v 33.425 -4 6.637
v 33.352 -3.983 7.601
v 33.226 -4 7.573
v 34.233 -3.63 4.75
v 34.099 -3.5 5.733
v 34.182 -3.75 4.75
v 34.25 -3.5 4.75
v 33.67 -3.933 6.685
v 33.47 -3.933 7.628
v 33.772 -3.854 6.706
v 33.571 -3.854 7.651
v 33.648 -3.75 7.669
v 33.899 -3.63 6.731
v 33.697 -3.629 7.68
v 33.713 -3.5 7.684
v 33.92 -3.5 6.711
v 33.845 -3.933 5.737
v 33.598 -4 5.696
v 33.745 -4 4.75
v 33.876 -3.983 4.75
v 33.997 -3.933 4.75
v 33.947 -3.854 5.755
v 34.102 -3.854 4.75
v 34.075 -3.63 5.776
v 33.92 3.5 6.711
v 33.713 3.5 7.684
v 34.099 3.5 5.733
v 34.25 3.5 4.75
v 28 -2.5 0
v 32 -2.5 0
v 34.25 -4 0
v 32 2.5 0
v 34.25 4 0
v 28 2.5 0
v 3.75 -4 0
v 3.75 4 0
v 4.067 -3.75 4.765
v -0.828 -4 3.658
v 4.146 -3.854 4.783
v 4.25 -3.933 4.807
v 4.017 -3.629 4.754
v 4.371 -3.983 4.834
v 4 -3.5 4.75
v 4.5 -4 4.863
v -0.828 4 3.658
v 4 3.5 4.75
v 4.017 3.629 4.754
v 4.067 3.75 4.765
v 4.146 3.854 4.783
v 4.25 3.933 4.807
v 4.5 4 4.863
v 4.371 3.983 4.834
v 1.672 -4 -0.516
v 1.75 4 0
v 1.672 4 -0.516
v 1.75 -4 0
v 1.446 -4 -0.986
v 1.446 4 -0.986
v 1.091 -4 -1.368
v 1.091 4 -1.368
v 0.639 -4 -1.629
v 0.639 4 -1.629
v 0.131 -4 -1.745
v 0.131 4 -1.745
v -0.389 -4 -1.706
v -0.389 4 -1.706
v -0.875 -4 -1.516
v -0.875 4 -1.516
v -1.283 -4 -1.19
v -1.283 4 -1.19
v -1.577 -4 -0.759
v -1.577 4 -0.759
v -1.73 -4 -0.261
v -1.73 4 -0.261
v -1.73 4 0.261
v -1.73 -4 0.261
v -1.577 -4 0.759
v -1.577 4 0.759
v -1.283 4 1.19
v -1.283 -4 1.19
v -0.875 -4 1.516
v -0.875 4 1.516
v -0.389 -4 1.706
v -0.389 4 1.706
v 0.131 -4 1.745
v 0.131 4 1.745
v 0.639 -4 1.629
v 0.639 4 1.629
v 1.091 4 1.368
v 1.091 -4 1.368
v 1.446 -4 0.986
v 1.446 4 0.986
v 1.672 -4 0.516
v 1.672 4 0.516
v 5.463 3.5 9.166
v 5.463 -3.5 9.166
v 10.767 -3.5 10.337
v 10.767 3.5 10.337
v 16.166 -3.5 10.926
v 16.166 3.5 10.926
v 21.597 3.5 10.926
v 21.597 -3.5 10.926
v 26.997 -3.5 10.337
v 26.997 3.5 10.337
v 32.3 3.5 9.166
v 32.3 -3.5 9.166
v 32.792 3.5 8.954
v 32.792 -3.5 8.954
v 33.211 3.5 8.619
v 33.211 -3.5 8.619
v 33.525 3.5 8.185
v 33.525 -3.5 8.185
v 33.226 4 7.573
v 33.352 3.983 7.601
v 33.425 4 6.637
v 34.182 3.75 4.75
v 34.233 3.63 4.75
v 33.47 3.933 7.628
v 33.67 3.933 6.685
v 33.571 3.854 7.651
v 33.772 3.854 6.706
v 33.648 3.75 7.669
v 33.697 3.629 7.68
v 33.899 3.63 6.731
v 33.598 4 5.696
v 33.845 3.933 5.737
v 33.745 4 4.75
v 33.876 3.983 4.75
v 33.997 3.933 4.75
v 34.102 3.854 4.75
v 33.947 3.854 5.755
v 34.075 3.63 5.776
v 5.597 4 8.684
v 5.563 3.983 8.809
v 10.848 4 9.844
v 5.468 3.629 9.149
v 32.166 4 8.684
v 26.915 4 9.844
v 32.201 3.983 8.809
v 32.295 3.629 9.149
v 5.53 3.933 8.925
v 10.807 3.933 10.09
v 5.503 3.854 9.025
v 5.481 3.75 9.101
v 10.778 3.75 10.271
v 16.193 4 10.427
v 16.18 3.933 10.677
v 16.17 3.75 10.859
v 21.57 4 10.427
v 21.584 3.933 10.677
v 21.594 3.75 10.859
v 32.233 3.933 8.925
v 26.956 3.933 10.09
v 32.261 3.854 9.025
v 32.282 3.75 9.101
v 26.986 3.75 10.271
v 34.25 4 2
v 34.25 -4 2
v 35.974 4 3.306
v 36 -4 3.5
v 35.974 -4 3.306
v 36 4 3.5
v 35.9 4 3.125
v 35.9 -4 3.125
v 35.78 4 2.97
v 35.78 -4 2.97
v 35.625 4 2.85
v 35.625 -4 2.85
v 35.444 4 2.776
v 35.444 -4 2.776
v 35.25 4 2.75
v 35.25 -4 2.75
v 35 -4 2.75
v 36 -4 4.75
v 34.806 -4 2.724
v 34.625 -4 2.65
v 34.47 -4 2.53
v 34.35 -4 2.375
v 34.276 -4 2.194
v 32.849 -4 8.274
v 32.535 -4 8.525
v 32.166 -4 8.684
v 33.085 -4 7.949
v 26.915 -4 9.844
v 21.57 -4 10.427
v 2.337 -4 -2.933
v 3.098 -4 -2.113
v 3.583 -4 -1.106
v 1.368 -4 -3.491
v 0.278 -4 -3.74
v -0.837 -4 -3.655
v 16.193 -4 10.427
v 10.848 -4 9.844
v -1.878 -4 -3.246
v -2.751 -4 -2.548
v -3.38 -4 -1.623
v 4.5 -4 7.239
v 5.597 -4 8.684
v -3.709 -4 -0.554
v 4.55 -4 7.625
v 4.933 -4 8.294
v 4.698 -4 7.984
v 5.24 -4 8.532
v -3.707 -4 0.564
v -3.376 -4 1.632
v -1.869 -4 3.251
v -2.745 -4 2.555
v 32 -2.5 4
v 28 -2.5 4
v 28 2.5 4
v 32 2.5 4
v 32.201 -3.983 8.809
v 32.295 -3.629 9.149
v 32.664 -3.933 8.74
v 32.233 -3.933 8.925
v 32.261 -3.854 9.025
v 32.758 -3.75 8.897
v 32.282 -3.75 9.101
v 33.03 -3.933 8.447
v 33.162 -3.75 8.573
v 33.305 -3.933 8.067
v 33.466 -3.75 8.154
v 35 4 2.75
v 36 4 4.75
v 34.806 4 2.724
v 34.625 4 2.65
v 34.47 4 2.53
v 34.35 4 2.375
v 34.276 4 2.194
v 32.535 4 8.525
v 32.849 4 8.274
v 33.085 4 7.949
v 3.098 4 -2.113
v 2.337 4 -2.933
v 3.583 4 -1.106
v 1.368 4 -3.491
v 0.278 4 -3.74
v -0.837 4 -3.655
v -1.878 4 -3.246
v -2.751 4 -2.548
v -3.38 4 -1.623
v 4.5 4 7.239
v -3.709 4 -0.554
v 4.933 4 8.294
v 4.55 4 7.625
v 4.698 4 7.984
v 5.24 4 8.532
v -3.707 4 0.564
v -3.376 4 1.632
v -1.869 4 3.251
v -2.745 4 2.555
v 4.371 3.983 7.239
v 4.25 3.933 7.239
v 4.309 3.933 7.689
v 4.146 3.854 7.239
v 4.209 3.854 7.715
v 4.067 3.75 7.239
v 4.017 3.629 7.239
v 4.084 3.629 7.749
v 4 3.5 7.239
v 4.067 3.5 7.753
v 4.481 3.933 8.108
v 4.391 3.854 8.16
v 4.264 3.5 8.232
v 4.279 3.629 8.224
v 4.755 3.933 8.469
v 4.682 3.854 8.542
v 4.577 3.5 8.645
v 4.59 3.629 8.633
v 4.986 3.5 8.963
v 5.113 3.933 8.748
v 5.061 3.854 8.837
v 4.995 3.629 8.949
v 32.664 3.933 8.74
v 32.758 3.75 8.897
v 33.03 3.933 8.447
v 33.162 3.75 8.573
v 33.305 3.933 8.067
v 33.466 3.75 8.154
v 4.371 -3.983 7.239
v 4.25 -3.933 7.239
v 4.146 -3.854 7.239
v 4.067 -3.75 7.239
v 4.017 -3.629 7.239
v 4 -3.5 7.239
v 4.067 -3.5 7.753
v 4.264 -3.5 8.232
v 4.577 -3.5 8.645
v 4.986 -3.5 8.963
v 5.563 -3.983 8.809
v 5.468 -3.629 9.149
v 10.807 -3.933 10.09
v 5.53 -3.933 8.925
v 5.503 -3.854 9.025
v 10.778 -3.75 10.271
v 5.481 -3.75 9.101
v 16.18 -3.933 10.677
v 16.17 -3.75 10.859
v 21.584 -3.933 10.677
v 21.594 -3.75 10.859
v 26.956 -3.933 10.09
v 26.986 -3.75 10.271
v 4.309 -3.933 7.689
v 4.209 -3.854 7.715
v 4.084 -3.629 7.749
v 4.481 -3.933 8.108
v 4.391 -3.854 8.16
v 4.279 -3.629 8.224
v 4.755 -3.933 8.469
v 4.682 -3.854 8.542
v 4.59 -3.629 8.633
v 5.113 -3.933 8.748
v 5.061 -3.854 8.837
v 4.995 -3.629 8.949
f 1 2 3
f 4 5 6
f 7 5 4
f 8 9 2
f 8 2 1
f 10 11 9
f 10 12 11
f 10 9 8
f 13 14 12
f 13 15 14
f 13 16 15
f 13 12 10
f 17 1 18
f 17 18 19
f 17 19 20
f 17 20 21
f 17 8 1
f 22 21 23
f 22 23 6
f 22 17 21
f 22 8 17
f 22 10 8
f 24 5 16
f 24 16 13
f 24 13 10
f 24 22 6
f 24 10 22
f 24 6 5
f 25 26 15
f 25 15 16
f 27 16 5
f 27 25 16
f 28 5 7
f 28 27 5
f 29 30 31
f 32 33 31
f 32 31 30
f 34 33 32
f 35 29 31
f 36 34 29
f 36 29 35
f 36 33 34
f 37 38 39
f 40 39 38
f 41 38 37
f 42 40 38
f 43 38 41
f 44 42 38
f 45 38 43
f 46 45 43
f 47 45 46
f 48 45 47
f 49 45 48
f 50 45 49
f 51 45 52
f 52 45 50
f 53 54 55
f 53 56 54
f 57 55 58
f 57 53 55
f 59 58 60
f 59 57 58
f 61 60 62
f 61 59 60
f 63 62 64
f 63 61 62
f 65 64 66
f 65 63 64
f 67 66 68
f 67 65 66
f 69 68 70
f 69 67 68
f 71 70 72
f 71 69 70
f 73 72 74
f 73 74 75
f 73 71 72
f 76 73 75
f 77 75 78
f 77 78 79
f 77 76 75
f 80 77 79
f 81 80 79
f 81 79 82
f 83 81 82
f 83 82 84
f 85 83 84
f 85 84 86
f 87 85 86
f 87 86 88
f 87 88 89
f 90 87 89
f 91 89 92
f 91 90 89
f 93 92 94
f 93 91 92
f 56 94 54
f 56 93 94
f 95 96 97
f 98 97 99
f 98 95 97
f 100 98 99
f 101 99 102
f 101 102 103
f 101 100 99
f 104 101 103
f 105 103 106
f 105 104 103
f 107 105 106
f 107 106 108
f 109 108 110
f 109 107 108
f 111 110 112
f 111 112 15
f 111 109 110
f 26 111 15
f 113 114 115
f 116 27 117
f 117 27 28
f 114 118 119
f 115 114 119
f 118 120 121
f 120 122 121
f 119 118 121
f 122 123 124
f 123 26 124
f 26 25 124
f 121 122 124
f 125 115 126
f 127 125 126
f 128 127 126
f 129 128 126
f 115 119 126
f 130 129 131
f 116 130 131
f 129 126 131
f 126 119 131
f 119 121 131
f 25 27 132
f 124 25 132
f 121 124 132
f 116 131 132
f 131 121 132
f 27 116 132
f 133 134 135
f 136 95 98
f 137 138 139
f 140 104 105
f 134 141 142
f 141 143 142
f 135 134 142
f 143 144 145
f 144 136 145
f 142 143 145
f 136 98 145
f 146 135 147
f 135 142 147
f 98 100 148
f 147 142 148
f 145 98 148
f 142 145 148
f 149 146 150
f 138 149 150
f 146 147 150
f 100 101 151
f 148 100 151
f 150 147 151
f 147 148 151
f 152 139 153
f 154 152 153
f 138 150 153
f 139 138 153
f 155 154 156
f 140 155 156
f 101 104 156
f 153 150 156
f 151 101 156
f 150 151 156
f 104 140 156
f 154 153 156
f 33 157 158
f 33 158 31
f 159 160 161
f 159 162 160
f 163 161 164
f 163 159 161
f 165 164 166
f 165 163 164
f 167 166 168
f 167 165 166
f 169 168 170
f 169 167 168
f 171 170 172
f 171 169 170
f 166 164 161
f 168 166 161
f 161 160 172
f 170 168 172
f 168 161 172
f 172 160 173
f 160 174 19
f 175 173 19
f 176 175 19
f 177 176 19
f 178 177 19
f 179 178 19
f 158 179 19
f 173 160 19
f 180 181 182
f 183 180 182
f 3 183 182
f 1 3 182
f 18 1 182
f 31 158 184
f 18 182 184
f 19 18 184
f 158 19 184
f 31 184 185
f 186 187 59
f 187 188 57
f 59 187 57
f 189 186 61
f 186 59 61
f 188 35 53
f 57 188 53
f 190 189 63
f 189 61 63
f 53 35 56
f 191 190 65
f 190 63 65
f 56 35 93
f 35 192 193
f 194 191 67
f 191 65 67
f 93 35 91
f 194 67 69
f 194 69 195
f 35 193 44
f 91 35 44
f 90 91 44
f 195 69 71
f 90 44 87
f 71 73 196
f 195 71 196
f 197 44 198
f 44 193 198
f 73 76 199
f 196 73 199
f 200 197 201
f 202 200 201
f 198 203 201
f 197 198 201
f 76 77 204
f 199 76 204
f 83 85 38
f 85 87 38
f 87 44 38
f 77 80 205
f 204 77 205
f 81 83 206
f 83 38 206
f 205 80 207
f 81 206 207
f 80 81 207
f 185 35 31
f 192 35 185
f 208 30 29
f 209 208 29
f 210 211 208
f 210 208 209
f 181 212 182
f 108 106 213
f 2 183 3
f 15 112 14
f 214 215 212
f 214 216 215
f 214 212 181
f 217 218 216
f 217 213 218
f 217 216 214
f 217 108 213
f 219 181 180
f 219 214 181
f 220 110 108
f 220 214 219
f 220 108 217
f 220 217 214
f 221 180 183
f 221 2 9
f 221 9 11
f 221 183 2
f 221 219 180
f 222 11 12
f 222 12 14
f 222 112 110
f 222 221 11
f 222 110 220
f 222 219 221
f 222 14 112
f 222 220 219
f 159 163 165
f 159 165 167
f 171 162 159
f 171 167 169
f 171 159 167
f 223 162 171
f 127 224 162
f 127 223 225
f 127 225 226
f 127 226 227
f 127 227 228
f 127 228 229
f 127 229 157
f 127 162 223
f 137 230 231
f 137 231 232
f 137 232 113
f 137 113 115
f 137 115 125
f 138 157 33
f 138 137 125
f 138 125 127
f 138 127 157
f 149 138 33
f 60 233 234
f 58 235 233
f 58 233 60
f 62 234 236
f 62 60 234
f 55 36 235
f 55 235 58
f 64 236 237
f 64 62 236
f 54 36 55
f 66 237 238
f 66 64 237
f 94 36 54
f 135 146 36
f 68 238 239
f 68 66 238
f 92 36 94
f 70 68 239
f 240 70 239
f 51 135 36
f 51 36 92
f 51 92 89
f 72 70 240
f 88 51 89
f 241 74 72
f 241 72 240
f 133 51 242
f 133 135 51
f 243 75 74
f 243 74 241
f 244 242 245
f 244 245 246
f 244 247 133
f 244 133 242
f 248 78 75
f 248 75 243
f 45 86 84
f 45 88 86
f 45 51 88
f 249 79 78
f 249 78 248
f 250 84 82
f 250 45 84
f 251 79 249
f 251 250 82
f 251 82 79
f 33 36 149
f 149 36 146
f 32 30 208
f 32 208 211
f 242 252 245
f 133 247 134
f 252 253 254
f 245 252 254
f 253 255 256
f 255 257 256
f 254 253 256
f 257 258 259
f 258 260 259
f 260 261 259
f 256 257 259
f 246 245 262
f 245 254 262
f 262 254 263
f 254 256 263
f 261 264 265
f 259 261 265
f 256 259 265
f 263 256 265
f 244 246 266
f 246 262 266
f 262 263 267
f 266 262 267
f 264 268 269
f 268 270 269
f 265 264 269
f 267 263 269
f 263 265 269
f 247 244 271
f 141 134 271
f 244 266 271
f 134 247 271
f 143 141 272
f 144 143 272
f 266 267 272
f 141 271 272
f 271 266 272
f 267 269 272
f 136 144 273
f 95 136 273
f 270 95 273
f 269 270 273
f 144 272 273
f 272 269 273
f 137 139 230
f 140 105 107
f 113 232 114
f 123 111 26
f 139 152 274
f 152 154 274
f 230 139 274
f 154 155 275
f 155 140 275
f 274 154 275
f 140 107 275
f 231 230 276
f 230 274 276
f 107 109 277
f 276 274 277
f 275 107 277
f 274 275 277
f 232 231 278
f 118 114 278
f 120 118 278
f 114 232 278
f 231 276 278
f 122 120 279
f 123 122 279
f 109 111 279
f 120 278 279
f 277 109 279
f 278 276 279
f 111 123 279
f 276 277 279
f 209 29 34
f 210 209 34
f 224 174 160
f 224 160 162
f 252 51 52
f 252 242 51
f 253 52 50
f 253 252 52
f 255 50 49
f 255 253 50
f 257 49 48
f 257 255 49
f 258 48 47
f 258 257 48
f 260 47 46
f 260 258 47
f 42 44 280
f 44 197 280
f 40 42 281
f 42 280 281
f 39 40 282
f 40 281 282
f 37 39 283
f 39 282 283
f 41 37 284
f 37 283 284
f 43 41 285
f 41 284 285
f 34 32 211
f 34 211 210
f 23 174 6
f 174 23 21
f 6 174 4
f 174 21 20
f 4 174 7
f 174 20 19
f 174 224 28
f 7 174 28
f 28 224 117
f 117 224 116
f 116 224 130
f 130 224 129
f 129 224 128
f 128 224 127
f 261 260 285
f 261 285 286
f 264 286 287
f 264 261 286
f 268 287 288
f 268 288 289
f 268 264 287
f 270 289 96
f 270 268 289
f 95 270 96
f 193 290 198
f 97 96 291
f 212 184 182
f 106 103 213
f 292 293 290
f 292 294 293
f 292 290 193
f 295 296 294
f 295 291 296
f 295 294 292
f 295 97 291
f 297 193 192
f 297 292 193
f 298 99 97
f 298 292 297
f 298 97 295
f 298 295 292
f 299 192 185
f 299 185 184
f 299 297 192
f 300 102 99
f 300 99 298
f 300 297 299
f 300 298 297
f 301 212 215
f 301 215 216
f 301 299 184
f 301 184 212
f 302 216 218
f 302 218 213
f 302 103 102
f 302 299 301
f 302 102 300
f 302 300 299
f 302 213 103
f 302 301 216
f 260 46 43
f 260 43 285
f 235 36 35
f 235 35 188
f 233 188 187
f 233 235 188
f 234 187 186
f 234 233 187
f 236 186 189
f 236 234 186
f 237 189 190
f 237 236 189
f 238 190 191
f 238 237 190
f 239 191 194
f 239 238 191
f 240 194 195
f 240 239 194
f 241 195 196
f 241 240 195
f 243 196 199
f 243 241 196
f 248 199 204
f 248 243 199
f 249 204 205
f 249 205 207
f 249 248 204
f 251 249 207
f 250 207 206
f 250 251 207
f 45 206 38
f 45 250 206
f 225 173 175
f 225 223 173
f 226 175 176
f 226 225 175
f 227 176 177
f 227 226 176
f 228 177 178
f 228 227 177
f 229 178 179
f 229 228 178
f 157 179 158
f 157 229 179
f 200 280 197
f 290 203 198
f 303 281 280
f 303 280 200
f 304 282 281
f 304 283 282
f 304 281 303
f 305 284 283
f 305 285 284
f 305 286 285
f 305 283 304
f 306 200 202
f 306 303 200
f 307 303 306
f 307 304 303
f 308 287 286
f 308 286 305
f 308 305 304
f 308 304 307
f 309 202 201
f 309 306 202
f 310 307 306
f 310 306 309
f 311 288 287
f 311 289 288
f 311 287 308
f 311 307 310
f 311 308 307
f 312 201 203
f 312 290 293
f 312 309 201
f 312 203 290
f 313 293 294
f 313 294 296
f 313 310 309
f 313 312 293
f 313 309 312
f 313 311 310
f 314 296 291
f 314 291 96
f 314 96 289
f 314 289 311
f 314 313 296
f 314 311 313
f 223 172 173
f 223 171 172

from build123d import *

# Parameters (mm, degrees)
SKETCH1_R           = 1.75
BOSS_EXTRUDE1_DEPTH = 4
SKETCH3_W           = 1.75
SKETCH3_H           = 8
BOSS_EXTRUDE2_DEPTH = 2
FILLET1_R           = 0.5
SKETCH4_W           = 4
SKETCH4_H           = 5
CUT_EXTRUDE1_DEPTH  = 4
FILLET2_R           = 0.75


with BuildPart() as part:
    # Sketch1 → Boss-Extrude1 (new, symmetric)
    with BuildSketch(Plane(origin=(0, 0, 0), x_dir=(1, 0, 0), z_dir=(0, 1, 0))):
        with BuildLine():
            Line((34.25, 0), (3.75, 0))
            ThreePointArc((3.75, 0), (-2.34080149, 2.929701074), (-0.827679139, -3.657519275))
            Line((-0.827679139, -3.657519275), (4, -4.75))
            Line((4, -4.75), (4, -7.239192993))
            ThreePointArc((4, -7.239192993), (4.407286712, -8.448847647), (5.463264382, -9.165826034))
            ThreePointArc((5.463264382, -9.165826034), (18.881654838, -11), (32.300045295, -9.165826034))
            ThreePointArc((32.300045295, -9.165826034), (33.210788376, -8.619339874), (33.713306247, -7.68361776))
            ThreePointArc((33.713306247, -7.68361776), (34.013295596, -6.222597745), (34.25, -4.75))
            Line((34.25, -4.75), (34.25, 0))
        make_face()
        Circle(SKETCH1_R, mode=Mode.SUBTRACT)
    extrude(amount=BOSS_EXTRUDE1_DEPTH, both=True)

    # Sketch3 → Boss-Extrude2 (add)
    with BuildSketch(Plane(origin=(0, 0, 4.75), x_dir=(-1, 0, 0), z_dir=(0, 0, -1))):
        with Locations((-35.125, 0)):
            Rectangle(SKETCH3_W, SKETCH3_H)
    extrude(amount=BOSS_EXTRUDE2_DEPTH)

    # Fillet1
    fillet1_edges = [part.edges().sort_by_distance(p)[0] for p in [
        (4, 4, 5.994596496),
        (4, -4, 5.994596496),
        (4.407286712, -4, 8.448847647),
        (18.881654838, -4, 11),
        (33.210788376, -4, 8.619339874),
        (34.013295596, -4, 6.222597745),
        (34.013295596, 4, 6.222597745),
        (33.210788376, 4, 8.619339874),
        (18.881654838, 4, 11),
        (4.407286712, 4, 8.448847647),
    ]]
    fillet(fillet1_edges, radius=FILLET1_R)

    # Sketch4 → Cut-Extrude1 (cut)
    with BuildSketch(Plane(origin=(0, 0, 0), x_dir=(-1, 0, 0), z_dir=(0, 0, -1))):
        with Locations((-30, 0)):
            Rectangle(SKETCH4_W, SKETCH4_H)
    extrude(amount=-CUT_EXTRUDE1_DEPTH, mode=Mode.SUBTRACT)

    # Fillet2
    fillet2_edges = [part.edges().sort_by_distance(p)[0] for p in [
        (34.25, 0, 2.75),
        (36, 0, 2.75),
    ]]
    fillet(fillet2_edges, radius=FILLET2_R)


solid = part.part
